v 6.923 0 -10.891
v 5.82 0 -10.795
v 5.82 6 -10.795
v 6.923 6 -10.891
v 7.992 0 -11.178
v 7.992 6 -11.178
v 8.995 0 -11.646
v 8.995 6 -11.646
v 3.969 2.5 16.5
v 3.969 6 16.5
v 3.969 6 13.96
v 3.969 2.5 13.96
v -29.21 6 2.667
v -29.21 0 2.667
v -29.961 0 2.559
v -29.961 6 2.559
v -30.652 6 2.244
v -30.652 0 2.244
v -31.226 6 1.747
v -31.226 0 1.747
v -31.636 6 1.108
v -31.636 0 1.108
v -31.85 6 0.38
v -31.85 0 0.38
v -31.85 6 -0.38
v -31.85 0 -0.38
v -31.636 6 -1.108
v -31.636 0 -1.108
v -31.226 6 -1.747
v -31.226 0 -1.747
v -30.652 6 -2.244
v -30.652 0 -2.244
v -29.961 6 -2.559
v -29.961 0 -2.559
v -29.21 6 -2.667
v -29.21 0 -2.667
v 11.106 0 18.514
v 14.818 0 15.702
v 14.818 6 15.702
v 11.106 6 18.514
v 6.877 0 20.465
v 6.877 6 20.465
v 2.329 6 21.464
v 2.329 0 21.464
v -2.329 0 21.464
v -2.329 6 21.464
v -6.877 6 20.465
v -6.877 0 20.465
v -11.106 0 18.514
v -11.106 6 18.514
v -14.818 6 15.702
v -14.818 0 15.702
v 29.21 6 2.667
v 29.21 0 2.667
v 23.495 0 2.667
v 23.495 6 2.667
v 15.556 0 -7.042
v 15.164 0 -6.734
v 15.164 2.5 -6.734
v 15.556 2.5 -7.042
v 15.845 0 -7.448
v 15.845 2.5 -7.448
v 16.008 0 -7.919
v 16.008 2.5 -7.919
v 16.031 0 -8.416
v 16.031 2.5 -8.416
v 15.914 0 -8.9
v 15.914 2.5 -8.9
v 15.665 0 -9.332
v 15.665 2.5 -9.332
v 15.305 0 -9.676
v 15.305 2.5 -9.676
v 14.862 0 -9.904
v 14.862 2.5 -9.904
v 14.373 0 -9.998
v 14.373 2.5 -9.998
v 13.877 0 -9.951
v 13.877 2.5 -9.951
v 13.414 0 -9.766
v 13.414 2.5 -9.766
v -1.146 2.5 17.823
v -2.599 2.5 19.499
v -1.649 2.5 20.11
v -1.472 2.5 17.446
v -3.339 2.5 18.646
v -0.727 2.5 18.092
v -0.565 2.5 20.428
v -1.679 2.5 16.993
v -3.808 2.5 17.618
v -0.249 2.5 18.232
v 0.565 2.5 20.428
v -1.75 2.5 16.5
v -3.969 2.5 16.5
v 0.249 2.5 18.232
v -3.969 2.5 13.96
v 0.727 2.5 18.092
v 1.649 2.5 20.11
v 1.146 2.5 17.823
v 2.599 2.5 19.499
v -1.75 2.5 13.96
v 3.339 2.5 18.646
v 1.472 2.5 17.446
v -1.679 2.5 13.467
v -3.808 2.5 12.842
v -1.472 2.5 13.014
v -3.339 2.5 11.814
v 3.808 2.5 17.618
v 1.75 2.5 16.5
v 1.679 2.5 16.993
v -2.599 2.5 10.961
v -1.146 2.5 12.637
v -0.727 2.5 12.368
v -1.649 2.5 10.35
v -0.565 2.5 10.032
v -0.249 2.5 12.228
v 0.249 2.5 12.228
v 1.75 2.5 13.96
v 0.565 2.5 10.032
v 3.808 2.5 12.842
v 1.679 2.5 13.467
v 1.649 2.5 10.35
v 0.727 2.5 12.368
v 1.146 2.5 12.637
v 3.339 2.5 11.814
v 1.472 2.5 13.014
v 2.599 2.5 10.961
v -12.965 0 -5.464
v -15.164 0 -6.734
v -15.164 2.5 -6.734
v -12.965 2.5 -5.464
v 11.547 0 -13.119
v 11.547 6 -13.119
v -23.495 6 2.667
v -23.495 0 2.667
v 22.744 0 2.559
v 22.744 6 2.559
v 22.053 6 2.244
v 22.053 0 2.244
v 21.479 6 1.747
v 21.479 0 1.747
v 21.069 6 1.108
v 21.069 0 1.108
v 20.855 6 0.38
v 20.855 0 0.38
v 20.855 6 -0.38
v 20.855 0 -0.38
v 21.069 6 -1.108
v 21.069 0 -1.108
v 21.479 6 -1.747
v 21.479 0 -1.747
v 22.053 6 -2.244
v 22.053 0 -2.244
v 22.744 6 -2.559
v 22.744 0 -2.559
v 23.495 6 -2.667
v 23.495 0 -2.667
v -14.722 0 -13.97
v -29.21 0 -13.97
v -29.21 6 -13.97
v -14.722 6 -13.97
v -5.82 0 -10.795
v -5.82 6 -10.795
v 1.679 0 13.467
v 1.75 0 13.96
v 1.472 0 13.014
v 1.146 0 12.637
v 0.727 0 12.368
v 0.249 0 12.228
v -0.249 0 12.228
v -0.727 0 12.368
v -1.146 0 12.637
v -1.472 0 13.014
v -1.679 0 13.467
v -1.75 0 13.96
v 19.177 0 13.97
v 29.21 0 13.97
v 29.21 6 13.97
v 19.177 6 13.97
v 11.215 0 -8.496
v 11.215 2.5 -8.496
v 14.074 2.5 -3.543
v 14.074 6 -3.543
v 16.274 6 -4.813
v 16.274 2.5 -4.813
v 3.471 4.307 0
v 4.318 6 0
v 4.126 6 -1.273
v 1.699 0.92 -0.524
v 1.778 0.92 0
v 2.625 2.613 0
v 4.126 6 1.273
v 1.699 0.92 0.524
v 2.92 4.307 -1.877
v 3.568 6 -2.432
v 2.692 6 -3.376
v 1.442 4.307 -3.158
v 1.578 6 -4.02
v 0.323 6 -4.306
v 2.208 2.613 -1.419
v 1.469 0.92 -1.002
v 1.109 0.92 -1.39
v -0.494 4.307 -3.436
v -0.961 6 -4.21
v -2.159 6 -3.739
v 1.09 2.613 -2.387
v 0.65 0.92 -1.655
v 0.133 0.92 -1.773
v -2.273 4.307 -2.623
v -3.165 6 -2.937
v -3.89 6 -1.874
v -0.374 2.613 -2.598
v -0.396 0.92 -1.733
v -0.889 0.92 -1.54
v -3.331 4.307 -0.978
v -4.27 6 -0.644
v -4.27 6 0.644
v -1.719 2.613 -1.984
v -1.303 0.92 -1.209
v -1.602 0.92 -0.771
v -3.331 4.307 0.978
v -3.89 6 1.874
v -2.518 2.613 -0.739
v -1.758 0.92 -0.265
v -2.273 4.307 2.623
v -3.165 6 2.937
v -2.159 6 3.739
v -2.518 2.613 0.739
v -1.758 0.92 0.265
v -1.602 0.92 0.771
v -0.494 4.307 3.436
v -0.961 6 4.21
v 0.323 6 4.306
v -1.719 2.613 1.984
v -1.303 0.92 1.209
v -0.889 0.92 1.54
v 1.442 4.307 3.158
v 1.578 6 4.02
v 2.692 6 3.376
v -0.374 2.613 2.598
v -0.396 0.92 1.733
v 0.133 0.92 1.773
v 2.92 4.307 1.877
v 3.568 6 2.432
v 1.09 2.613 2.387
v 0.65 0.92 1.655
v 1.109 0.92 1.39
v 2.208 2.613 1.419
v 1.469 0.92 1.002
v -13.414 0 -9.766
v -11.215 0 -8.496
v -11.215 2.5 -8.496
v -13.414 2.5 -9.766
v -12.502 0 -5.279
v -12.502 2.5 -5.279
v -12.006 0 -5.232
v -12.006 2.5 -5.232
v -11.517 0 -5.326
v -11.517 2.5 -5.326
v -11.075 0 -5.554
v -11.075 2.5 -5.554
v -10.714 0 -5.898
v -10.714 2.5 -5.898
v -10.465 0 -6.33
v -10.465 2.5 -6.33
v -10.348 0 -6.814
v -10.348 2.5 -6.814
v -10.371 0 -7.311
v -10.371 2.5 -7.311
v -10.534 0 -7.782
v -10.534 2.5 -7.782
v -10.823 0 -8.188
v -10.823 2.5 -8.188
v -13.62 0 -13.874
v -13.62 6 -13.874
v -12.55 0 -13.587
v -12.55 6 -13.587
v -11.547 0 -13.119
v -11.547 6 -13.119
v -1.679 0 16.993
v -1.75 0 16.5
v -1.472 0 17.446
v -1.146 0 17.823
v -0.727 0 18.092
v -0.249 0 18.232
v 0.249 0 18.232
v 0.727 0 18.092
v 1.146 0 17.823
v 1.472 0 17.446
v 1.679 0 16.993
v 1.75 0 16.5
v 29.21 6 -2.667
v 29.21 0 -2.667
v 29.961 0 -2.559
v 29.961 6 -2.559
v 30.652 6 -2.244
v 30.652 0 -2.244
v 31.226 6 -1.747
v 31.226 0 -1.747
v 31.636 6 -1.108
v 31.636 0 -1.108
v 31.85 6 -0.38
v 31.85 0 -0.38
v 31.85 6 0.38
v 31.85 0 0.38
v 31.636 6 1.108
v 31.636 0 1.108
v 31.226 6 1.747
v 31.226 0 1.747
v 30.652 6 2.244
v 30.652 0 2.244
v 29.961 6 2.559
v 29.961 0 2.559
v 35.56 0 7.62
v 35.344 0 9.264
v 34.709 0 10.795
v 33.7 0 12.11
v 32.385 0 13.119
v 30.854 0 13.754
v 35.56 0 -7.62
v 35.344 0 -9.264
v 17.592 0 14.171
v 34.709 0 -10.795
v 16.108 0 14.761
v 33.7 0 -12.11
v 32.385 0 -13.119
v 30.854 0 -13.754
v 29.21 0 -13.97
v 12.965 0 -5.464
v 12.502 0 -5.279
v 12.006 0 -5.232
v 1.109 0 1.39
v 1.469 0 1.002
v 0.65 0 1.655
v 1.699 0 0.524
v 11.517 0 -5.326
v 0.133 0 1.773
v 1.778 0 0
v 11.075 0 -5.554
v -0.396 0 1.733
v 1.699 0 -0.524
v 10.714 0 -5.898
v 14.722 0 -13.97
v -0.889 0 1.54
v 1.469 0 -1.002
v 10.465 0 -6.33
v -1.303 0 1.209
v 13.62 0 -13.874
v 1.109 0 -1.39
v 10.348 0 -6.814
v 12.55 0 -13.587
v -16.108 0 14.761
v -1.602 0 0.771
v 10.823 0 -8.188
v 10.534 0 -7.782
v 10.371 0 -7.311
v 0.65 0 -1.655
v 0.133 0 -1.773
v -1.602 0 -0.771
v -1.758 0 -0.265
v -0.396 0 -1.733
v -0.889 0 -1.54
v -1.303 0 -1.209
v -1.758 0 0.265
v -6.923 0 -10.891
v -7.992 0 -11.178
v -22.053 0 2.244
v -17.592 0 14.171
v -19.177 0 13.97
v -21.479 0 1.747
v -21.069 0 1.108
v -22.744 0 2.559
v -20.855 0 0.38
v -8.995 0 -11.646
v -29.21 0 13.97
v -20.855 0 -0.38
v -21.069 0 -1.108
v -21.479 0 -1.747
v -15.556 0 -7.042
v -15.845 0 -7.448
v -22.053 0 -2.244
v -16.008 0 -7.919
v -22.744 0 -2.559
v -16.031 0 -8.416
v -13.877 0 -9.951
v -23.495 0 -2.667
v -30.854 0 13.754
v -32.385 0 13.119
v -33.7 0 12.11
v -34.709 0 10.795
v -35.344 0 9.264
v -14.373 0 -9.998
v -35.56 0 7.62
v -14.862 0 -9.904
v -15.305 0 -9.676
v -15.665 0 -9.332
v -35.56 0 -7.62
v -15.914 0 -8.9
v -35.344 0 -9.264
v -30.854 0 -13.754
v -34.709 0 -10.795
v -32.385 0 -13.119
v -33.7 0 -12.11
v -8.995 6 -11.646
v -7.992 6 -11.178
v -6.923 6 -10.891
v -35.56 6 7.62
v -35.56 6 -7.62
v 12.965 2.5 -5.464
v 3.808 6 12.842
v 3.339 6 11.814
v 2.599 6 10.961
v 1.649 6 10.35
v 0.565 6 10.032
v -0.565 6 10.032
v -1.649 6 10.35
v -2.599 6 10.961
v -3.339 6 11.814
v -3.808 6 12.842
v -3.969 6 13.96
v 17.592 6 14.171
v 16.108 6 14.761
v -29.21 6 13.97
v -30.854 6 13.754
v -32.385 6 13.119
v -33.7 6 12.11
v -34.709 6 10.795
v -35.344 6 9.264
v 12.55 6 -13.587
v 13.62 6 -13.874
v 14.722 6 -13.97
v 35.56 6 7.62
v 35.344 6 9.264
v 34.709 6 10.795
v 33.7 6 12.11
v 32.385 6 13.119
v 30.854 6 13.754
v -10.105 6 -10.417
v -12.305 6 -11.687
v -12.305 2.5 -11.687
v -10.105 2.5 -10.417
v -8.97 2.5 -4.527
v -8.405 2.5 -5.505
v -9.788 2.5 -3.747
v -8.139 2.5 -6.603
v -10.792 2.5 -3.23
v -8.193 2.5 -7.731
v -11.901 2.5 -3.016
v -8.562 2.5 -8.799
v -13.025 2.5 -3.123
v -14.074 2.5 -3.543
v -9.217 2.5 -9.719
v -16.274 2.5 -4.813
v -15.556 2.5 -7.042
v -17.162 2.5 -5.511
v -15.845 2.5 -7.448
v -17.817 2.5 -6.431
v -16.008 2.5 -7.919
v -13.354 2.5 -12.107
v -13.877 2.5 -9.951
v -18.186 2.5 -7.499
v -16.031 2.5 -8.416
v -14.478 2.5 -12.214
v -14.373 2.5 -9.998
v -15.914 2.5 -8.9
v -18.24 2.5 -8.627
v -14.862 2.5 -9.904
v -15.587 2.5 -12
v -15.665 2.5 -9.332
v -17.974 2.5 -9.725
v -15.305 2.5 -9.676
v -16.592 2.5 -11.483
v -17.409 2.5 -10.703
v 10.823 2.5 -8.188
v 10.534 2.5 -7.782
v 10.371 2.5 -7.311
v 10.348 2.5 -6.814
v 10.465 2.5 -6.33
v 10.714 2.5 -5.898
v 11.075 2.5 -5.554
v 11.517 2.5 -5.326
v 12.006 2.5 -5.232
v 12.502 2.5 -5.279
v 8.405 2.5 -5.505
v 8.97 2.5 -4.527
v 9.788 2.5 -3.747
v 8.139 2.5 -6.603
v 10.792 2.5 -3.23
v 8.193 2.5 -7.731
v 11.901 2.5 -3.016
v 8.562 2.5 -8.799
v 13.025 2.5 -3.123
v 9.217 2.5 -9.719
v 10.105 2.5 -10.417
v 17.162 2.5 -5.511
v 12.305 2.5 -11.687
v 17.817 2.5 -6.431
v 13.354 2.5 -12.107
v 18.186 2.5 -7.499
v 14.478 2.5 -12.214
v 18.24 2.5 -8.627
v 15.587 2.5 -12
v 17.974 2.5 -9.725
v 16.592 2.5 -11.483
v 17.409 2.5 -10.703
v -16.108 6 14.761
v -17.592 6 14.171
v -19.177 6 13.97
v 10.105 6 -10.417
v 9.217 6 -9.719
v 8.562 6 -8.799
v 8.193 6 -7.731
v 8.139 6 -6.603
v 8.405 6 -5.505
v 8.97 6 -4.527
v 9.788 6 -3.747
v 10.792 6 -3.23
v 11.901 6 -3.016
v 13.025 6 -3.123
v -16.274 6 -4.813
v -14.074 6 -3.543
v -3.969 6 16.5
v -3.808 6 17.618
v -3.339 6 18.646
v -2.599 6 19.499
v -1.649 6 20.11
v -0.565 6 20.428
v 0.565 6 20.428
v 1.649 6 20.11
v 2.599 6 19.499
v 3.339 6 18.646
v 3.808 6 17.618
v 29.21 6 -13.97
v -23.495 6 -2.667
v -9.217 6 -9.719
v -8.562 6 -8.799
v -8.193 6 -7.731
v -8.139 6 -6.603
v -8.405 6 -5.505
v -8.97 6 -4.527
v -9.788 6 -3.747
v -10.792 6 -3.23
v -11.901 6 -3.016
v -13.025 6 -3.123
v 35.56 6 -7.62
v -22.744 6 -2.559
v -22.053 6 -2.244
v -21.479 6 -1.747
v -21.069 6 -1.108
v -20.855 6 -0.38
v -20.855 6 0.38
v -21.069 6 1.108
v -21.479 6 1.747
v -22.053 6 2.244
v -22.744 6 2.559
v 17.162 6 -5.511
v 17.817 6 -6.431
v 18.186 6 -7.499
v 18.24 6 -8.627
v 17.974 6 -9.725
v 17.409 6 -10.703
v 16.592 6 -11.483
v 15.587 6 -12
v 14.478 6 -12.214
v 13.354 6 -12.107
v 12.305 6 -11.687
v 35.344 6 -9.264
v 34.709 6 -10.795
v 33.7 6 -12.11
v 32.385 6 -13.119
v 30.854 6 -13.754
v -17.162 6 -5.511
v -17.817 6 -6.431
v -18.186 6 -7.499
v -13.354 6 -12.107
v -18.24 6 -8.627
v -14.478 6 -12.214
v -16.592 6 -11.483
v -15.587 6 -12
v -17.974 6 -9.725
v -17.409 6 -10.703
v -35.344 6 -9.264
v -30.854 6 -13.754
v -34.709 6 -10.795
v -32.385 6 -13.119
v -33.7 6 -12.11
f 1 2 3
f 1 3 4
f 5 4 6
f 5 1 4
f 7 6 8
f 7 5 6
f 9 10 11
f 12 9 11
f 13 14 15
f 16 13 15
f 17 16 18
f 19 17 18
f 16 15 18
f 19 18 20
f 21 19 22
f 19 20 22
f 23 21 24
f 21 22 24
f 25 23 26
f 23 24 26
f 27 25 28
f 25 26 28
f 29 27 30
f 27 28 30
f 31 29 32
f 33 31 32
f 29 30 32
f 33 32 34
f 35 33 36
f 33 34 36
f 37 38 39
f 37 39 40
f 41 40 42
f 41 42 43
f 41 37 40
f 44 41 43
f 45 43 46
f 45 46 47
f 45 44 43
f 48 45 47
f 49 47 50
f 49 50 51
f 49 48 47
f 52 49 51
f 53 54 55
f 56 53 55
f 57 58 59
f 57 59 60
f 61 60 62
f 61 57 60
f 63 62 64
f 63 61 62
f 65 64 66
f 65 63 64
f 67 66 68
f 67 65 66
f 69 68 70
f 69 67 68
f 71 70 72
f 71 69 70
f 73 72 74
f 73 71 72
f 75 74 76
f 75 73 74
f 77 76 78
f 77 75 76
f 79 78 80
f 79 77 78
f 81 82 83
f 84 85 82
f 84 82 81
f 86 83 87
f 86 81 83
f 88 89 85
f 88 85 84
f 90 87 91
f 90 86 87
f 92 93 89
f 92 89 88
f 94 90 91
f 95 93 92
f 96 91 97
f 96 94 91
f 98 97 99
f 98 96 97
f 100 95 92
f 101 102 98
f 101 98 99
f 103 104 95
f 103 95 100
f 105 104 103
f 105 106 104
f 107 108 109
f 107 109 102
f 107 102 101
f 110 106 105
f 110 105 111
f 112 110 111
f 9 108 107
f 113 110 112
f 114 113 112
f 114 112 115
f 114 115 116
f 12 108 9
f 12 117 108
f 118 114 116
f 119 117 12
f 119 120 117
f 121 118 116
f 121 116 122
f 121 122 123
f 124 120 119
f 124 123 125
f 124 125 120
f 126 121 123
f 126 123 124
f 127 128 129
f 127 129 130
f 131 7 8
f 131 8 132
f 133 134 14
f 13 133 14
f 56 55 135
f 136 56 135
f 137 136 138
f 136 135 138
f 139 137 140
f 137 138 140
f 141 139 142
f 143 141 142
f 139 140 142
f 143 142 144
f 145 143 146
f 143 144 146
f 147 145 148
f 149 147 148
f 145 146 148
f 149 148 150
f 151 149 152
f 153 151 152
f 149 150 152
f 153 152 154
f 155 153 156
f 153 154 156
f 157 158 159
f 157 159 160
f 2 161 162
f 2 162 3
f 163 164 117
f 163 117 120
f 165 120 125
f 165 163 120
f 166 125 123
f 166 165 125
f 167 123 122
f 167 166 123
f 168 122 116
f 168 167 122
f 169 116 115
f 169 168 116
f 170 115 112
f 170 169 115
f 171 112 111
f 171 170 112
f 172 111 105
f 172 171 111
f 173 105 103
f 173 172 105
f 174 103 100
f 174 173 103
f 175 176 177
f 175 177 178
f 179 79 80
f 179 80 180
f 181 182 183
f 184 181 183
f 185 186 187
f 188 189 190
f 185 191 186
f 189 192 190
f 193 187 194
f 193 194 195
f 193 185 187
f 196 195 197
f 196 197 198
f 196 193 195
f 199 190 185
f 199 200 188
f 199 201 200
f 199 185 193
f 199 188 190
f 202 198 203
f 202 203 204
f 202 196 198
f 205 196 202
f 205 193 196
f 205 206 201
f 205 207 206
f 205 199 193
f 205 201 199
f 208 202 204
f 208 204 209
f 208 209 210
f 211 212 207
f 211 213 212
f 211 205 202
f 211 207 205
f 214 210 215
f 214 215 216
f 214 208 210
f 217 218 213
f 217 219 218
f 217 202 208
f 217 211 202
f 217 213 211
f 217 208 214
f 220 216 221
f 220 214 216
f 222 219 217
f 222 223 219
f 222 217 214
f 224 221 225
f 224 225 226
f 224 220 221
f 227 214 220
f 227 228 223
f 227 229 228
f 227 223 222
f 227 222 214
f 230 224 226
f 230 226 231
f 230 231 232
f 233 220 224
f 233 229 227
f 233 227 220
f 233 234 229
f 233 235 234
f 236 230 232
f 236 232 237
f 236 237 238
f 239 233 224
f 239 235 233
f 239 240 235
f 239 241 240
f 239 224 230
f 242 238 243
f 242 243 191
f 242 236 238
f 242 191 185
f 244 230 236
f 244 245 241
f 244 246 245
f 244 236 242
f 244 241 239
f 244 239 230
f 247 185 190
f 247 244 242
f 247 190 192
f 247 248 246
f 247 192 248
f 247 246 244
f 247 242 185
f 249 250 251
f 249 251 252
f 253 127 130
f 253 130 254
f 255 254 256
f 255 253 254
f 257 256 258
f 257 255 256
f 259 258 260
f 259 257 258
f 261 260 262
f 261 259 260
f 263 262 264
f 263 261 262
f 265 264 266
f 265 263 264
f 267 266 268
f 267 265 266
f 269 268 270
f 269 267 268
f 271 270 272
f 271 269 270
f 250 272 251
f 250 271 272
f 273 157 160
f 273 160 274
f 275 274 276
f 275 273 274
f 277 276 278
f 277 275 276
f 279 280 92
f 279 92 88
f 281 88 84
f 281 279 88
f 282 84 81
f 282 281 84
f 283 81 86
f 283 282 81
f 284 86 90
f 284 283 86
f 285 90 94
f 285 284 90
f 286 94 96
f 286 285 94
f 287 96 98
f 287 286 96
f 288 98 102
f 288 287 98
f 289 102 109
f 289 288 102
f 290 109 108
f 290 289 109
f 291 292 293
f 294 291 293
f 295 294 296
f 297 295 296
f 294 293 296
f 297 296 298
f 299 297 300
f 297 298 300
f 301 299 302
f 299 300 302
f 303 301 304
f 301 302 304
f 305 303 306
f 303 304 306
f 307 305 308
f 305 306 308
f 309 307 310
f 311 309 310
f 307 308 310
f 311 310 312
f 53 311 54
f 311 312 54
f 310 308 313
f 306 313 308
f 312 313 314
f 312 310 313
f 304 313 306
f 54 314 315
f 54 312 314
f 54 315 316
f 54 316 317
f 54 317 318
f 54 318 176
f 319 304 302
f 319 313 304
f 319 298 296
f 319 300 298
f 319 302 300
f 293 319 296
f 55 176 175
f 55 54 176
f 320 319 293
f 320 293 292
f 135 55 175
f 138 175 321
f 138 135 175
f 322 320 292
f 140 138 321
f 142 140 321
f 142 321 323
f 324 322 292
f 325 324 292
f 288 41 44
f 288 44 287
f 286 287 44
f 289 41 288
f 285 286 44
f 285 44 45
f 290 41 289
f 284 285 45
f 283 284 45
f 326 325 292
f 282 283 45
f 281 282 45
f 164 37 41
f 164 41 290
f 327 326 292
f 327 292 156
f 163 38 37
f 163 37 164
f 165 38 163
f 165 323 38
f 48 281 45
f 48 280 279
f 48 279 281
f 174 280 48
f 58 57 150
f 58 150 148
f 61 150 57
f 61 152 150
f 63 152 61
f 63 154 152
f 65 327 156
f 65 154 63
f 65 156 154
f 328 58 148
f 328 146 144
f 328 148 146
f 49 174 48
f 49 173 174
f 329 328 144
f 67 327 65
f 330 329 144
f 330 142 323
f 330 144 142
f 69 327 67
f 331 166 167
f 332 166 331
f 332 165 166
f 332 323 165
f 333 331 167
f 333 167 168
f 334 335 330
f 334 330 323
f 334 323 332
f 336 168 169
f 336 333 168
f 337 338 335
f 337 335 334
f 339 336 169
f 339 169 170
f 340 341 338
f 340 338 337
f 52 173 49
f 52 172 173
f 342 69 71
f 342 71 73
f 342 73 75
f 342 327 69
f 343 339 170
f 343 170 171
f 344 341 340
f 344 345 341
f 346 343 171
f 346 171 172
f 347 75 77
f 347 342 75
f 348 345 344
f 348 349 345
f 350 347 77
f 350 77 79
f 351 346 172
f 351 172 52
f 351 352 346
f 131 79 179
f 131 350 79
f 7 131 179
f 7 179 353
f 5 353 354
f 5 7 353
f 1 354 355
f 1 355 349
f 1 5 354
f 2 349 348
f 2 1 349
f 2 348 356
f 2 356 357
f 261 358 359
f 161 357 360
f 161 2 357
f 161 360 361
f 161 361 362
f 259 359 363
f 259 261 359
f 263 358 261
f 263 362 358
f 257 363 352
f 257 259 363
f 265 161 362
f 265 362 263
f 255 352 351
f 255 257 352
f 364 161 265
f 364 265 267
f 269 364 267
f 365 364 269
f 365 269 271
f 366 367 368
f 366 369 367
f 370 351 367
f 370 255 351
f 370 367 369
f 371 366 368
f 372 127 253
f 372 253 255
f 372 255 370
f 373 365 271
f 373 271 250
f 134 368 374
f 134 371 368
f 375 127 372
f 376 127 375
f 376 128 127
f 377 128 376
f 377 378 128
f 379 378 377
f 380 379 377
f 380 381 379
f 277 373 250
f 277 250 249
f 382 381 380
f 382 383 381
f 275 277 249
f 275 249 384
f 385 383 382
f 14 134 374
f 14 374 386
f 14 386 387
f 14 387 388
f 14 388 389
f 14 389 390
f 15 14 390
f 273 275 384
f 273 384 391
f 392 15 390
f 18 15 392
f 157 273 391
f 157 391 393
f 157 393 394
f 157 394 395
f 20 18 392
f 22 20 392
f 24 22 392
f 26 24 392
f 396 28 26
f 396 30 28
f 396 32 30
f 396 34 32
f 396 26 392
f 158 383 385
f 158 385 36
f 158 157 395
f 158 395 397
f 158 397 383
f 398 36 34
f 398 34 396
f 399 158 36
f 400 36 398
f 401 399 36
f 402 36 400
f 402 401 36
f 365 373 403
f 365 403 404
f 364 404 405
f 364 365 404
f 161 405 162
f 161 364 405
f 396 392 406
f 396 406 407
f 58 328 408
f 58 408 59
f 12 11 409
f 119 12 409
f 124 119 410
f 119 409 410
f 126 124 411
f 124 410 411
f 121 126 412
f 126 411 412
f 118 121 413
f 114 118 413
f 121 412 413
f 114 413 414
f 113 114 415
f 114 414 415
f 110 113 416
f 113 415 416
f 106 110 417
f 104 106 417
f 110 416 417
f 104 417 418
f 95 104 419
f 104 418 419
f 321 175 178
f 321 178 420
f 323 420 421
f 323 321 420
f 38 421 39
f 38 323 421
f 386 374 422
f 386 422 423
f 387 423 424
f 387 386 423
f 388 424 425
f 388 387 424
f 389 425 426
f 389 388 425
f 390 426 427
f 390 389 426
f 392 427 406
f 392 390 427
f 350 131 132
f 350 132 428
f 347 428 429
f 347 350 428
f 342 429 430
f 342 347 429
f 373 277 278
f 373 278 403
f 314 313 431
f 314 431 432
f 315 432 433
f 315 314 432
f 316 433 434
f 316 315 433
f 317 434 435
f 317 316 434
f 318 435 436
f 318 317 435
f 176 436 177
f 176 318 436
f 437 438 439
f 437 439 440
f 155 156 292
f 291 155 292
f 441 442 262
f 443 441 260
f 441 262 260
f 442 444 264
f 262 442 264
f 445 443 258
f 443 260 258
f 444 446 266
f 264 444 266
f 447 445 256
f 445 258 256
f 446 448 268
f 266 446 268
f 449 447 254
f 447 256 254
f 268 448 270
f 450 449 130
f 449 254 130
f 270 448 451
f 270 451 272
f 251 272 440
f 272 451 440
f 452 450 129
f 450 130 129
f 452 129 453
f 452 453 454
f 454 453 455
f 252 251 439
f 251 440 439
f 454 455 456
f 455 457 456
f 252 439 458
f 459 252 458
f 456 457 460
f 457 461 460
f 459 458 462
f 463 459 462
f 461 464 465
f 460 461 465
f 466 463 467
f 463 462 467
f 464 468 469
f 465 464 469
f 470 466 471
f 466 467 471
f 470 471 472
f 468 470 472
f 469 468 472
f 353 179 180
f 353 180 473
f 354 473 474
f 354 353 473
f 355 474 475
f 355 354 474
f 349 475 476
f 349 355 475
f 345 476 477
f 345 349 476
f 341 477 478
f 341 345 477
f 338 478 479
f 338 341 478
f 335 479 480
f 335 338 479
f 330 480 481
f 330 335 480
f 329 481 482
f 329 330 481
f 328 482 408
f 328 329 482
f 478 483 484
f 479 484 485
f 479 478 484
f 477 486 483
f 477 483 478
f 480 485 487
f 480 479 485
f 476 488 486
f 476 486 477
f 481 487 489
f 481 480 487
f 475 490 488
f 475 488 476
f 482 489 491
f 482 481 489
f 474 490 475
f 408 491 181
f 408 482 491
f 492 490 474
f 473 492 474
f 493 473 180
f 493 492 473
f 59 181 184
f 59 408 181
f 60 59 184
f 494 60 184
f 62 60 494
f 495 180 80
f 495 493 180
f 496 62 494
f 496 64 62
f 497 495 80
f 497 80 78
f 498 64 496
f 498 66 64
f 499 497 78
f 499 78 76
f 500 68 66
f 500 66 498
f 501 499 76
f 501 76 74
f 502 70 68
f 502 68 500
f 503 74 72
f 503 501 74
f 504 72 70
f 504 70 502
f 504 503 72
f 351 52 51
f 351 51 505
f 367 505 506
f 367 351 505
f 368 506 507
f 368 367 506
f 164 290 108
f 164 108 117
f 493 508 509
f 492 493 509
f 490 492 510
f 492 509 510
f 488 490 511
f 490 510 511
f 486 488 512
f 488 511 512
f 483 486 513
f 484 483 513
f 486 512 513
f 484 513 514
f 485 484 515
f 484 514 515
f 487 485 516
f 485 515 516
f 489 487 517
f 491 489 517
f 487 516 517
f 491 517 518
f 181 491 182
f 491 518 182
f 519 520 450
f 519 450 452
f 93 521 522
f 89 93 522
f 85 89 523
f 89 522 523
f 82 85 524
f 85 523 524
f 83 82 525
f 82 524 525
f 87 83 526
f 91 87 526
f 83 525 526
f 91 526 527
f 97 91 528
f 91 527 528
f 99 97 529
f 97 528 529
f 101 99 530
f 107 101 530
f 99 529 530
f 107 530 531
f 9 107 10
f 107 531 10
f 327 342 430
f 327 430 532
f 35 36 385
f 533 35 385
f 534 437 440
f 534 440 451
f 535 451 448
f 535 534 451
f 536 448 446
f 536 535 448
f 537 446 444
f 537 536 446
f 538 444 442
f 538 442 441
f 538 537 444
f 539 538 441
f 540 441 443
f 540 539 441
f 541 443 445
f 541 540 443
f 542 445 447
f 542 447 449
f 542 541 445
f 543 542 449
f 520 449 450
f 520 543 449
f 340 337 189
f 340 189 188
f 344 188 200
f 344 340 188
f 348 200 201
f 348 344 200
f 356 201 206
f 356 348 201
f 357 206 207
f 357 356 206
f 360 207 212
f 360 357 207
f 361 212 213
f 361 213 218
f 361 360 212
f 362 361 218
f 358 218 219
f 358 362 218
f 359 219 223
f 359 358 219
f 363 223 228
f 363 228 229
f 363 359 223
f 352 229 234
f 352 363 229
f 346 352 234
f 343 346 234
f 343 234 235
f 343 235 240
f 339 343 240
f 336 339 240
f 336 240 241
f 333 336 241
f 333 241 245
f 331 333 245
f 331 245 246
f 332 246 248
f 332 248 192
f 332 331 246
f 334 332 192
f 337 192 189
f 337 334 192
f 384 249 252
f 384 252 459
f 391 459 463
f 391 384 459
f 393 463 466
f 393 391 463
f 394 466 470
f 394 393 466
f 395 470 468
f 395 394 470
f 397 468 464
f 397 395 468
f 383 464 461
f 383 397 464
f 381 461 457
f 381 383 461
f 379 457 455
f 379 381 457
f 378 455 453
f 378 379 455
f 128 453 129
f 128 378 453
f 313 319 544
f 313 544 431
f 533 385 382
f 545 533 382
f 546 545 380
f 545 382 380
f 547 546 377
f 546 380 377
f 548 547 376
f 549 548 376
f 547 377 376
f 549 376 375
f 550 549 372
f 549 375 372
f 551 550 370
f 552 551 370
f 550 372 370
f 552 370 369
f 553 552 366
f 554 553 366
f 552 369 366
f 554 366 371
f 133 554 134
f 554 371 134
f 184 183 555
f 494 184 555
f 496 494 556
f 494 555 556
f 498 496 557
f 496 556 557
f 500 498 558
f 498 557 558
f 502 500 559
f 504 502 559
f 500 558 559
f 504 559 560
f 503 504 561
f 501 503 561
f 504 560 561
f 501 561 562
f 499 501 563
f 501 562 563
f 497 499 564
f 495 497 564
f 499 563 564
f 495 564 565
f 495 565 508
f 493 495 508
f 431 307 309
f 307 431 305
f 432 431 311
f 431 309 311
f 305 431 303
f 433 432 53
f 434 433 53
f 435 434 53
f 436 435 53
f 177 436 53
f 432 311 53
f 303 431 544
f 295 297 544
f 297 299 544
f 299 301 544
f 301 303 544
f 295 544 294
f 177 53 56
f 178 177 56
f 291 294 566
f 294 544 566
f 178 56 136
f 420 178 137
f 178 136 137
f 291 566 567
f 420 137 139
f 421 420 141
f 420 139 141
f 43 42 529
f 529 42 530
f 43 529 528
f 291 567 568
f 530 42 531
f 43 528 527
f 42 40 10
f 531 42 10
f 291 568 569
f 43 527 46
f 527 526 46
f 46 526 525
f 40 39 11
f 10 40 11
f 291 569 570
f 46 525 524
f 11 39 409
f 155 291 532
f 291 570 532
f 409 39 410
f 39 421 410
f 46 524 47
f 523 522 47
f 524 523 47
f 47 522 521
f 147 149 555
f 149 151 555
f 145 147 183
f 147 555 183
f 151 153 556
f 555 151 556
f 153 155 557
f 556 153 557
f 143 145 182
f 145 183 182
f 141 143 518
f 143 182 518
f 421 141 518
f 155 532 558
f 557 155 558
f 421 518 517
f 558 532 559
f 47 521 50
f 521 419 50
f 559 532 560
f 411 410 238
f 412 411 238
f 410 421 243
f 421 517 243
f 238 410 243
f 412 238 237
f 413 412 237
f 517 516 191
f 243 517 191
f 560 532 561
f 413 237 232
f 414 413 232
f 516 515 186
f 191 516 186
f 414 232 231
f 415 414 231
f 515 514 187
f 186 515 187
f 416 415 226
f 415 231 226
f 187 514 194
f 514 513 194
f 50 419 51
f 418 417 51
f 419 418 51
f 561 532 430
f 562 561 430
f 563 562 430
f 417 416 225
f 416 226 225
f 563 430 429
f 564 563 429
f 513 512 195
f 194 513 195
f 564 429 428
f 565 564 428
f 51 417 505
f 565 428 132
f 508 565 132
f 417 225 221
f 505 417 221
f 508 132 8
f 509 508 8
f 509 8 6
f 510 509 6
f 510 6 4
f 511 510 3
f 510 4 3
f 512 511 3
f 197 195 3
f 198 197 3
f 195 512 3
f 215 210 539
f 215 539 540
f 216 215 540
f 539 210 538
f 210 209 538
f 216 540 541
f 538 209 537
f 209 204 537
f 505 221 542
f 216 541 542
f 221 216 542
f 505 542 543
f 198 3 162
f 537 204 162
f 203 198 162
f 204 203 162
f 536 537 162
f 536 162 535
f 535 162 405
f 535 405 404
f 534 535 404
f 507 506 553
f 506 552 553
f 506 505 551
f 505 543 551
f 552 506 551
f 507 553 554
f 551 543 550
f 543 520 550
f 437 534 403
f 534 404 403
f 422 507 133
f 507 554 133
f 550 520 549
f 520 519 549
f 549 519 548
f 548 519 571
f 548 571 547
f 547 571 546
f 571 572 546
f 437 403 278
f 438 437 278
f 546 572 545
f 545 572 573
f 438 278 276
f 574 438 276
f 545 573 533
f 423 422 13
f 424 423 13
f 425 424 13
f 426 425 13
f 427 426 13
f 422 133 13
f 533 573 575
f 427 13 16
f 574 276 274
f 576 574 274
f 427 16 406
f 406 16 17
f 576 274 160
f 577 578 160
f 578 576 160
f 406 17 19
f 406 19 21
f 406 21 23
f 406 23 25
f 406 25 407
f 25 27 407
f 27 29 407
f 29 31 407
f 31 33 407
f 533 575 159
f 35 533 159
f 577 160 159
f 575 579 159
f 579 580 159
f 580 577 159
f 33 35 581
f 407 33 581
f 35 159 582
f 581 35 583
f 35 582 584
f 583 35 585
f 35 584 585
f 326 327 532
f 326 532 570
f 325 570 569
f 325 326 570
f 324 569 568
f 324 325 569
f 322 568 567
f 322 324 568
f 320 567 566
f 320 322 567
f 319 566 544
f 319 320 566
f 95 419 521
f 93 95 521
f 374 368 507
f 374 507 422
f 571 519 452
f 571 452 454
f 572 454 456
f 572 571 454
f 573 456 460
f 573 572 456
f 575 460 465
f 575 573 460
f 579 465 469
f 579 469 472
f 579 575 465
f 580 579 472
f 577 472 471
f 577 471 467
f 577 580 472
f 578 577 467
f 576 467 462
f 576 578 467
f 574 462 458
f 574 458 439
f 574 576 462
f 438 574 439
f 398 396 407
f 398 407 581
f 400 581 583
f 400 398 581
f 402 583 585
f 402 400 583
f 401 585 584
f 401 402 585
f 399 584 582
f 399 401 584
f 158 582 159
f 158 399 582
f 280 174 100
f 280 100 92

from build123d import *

# Parameters (mm, degrees)
SKETCH1_R           = 1.778
BOSS_EXTRUDE1_DEPTH = 6
CUT_EXTRUDE1_DEPTH  = 3.5
CHAMFER1_SIZE       = 2.54
CHAMFER1_SIZE2      = 5.08


with BuildPart() as part:
    # Sketch1 → Boss-Extrude1 (new body)
    with BuildSketch(Plane(origin=(0, 0, 0), x_dir=(1, 0, 0), z_dir=(0, 1, 0))):
        with BuildLine():
            Line((14.722227154, 13.97), (29.21, 13.97))
            ThreePointArc((29.21, 13.97), (33.700128061, 12.110128061), (35.56, 7.62))
            Line((35.56, 7.62), (35.56, -7.62))
            ThreePointArc((35.56, -7.62), (33.700128061, -12.110128061), (29.21, -13.97))
            Line((29.21, -13.97), (19.176579466, -13.97))
            ThreePointArc((19.176579466, -13.97), (16.831686562, -14.418815604), (14.818265951, -15.701818182))
            ThreePointArc((14.818265951, -15.701818182), (0, -21.59), (-14.818265951, -15.701818182))
            ThreePointArc((-14.818265951, -15.701818182), (-16.831686562, -14.418815604), (-19.176579466, -13.97))
            Line((-19.176579466, -13.97), (-29.21, -13.97))
            ThreePointArc((-29.21, -13.97), (-33.700128061, -12.110128061), (-35.56, -7.62))
            Line((-35.56, -7.62), (-35.56, 7.62))
            ThreePointArc((-35.56, 7.62), (-33.700128061, 12.110128061), (-29.21, 13.97))
            Line((-29.21, 13.97), (-14.722227154, 13.97))
            ThreePointArc((-14.722227154, 13.97), (-13.078726217, 13.753628997), (-11.547227154, 13.119261314))
            Line((-11.547227154, 13.119261314), (-8.995011096, 11.645738686))
            ThreePointArc((-8.995011096, 11.645738686), (-7.463512032, 11.011371003), (-5.820011096, 10.795))
            Line((-5.820011096, 10.795), (5.820011096, 10.795))
            ThreePointArc((5.820011096, 10.795), (7.463512032, 11.011371003), (8.995011096, 11.645738686))
            Line((8.995011096, 11.645738686), (11.547227154, 13.119261314))
            ThreePointArc((11.547227154, 13.119261314), (13.078726217, 13.753628997), (14.722227154, 13.97))
        make_face()
        Circle(SKETCH1_R, mode=Mode.SUBTRACT)
        with BuildLine():
            Line((-23.495, -2.667), (-29.21, -2.667))
            ThreePointArc((-29.21, -2.667), (-31.877, 0), (-29.21, 2.667))
            Line((-29.21, 2.667), (-23.495, 2.667))
            ThreePointArc((-23.495, 2.667), (-20.828, 0), (-23.495, -2.667))
        make_face(mode=Mode.SUBTRACT)
        with BuildLine():
            Line((23.495, 2.667), (29.21, 2.667))
            ThreePointArc((29.21, 2.667), (31.877, 0), (29.21, -2.667))
            Line((29.21, -2.667), (23.495, -2.667))
            ThreePointArc((23.495, -2.667), (20.828, 0), (23.495, 2.667))
        make_face(mode=Mode.SUBTRACT)
        with BuildLine():
            Line((-15.164419162, 6.734455543), (-12.964714637, 5.464455543))
            ThreePointArc((-12.964714637, 5.464455543), (-10.57417018, 6.105), (-11.214714637, 8.495544457))
            Line((-11.214714637, 8.495544457), (-13.414419162, 9.765544457))
            ThreePointArc((-13.414419162, 9.765544457), (-15.804963619, 9.125), (-15.164419162, 6.734455543))
        make_face(mode=Mode.SUBTRACT)
        with BuildLine():
            Line((13.414419162, 9.765544457), (11.214714637, 8.495544457))
            ThreePointArc((11.214714637, 8.495544457), (10.57417018, 6.105), (12.964714637, 5.464455543))
            Line((12.964714637, 5.464455543), (15.164419162, 6.734455543))
            ThreePointArc((15.164419162, 6.734455543), (15.804963619, 9.125), (13.414419162, 9.765544457))
        make_face(mode=Mode.SUBTRACT)
        with BuildLine():
            Line((1.75, -16.5), (1.75, -13.96))
            ThreePointArc((1.75, -13.96), (0, -12.21), (-1.75, -13.96))
            Line((-1.75, -13.96), (-1.75, -16.5))
            ThreePointArc((-1.75, -16.5), (0, -18.25), (1.75, -16.5))
        make_face(mode=Mode.SUBTRACT)
    extrude(amount=BOSS_EXTRUDE1_DEPTH)

    # Sketch5 → Cut-Extrude1 (cut)
    with BuildSketch(Plane(origin=(0, 6, 0), x_dir=(1, 0, 0), z_dir=(0, 1, 0))):
        with BuildLine():
            Line((-3.96875, -13.96), (-3.96875, -16.5))
            ThreePointArc((-3.96875, -16.5), (0, -20.46875), (3.96875, -16.5))
            Line((3.96875, -16.5), (3.96875, -13.96))
            ThreePointArc((3.96875, -13.96), (0, -9.99125), (-3.96875, -13.96))
        make_face()
        with BuildLine():
            Line((12.305044162, 11.687038321), (10.105339637, 10.417038321))
            ThreePointArc((10.105339637, 10.417038321), (8.652676316, 4.995625), (14.074089637, 3.542961679))
            Line((14.074089637, 3.542961679), (16.273794162, 4.812961679))
            ThreePointArc((16.273794162, 4.812961679), (17.726457484, 10.234375), (12.305044162, 11.687038321))
        make_face()
        with BuildLine():
            Line((-12.305044162, 11.687038321), (-10.105339637, 10.417038321))
            ThreePointArc((-10.105339637, 10.417038321), (-8.652676316, 4.995625), (-14.074089637, 3.542961679))
            Line((-14.074089637, 3.542961679), (-16.273794162, 4.812961679))
            ThreePointArc((-16.273794162, 4.812961679), (-17.726457484, 10.234375), (-12.305044162, 11.687038321))
        make_face()
    extrude(amount=-CUT_EXTRUDE1_DEPTH, mode=Mode.SUBTRACT)

    # Chamfer1
    chamfer1_edges = [part.edges().sort_by_distance(p)[0] for p in [
        (-1.778, 6, 0),
    ]]
    chamfer1_side = [part.faces().sort_by_distance(p)[0] for p in [
        (0, 6, 2.195443335),
    ]]
    chamfer(chamfer1_edges, length=CHAMFER1_SIZE, length2=CHAMFER1_SIZE2, reference=chamfer1_side[0])


solid = part.part
